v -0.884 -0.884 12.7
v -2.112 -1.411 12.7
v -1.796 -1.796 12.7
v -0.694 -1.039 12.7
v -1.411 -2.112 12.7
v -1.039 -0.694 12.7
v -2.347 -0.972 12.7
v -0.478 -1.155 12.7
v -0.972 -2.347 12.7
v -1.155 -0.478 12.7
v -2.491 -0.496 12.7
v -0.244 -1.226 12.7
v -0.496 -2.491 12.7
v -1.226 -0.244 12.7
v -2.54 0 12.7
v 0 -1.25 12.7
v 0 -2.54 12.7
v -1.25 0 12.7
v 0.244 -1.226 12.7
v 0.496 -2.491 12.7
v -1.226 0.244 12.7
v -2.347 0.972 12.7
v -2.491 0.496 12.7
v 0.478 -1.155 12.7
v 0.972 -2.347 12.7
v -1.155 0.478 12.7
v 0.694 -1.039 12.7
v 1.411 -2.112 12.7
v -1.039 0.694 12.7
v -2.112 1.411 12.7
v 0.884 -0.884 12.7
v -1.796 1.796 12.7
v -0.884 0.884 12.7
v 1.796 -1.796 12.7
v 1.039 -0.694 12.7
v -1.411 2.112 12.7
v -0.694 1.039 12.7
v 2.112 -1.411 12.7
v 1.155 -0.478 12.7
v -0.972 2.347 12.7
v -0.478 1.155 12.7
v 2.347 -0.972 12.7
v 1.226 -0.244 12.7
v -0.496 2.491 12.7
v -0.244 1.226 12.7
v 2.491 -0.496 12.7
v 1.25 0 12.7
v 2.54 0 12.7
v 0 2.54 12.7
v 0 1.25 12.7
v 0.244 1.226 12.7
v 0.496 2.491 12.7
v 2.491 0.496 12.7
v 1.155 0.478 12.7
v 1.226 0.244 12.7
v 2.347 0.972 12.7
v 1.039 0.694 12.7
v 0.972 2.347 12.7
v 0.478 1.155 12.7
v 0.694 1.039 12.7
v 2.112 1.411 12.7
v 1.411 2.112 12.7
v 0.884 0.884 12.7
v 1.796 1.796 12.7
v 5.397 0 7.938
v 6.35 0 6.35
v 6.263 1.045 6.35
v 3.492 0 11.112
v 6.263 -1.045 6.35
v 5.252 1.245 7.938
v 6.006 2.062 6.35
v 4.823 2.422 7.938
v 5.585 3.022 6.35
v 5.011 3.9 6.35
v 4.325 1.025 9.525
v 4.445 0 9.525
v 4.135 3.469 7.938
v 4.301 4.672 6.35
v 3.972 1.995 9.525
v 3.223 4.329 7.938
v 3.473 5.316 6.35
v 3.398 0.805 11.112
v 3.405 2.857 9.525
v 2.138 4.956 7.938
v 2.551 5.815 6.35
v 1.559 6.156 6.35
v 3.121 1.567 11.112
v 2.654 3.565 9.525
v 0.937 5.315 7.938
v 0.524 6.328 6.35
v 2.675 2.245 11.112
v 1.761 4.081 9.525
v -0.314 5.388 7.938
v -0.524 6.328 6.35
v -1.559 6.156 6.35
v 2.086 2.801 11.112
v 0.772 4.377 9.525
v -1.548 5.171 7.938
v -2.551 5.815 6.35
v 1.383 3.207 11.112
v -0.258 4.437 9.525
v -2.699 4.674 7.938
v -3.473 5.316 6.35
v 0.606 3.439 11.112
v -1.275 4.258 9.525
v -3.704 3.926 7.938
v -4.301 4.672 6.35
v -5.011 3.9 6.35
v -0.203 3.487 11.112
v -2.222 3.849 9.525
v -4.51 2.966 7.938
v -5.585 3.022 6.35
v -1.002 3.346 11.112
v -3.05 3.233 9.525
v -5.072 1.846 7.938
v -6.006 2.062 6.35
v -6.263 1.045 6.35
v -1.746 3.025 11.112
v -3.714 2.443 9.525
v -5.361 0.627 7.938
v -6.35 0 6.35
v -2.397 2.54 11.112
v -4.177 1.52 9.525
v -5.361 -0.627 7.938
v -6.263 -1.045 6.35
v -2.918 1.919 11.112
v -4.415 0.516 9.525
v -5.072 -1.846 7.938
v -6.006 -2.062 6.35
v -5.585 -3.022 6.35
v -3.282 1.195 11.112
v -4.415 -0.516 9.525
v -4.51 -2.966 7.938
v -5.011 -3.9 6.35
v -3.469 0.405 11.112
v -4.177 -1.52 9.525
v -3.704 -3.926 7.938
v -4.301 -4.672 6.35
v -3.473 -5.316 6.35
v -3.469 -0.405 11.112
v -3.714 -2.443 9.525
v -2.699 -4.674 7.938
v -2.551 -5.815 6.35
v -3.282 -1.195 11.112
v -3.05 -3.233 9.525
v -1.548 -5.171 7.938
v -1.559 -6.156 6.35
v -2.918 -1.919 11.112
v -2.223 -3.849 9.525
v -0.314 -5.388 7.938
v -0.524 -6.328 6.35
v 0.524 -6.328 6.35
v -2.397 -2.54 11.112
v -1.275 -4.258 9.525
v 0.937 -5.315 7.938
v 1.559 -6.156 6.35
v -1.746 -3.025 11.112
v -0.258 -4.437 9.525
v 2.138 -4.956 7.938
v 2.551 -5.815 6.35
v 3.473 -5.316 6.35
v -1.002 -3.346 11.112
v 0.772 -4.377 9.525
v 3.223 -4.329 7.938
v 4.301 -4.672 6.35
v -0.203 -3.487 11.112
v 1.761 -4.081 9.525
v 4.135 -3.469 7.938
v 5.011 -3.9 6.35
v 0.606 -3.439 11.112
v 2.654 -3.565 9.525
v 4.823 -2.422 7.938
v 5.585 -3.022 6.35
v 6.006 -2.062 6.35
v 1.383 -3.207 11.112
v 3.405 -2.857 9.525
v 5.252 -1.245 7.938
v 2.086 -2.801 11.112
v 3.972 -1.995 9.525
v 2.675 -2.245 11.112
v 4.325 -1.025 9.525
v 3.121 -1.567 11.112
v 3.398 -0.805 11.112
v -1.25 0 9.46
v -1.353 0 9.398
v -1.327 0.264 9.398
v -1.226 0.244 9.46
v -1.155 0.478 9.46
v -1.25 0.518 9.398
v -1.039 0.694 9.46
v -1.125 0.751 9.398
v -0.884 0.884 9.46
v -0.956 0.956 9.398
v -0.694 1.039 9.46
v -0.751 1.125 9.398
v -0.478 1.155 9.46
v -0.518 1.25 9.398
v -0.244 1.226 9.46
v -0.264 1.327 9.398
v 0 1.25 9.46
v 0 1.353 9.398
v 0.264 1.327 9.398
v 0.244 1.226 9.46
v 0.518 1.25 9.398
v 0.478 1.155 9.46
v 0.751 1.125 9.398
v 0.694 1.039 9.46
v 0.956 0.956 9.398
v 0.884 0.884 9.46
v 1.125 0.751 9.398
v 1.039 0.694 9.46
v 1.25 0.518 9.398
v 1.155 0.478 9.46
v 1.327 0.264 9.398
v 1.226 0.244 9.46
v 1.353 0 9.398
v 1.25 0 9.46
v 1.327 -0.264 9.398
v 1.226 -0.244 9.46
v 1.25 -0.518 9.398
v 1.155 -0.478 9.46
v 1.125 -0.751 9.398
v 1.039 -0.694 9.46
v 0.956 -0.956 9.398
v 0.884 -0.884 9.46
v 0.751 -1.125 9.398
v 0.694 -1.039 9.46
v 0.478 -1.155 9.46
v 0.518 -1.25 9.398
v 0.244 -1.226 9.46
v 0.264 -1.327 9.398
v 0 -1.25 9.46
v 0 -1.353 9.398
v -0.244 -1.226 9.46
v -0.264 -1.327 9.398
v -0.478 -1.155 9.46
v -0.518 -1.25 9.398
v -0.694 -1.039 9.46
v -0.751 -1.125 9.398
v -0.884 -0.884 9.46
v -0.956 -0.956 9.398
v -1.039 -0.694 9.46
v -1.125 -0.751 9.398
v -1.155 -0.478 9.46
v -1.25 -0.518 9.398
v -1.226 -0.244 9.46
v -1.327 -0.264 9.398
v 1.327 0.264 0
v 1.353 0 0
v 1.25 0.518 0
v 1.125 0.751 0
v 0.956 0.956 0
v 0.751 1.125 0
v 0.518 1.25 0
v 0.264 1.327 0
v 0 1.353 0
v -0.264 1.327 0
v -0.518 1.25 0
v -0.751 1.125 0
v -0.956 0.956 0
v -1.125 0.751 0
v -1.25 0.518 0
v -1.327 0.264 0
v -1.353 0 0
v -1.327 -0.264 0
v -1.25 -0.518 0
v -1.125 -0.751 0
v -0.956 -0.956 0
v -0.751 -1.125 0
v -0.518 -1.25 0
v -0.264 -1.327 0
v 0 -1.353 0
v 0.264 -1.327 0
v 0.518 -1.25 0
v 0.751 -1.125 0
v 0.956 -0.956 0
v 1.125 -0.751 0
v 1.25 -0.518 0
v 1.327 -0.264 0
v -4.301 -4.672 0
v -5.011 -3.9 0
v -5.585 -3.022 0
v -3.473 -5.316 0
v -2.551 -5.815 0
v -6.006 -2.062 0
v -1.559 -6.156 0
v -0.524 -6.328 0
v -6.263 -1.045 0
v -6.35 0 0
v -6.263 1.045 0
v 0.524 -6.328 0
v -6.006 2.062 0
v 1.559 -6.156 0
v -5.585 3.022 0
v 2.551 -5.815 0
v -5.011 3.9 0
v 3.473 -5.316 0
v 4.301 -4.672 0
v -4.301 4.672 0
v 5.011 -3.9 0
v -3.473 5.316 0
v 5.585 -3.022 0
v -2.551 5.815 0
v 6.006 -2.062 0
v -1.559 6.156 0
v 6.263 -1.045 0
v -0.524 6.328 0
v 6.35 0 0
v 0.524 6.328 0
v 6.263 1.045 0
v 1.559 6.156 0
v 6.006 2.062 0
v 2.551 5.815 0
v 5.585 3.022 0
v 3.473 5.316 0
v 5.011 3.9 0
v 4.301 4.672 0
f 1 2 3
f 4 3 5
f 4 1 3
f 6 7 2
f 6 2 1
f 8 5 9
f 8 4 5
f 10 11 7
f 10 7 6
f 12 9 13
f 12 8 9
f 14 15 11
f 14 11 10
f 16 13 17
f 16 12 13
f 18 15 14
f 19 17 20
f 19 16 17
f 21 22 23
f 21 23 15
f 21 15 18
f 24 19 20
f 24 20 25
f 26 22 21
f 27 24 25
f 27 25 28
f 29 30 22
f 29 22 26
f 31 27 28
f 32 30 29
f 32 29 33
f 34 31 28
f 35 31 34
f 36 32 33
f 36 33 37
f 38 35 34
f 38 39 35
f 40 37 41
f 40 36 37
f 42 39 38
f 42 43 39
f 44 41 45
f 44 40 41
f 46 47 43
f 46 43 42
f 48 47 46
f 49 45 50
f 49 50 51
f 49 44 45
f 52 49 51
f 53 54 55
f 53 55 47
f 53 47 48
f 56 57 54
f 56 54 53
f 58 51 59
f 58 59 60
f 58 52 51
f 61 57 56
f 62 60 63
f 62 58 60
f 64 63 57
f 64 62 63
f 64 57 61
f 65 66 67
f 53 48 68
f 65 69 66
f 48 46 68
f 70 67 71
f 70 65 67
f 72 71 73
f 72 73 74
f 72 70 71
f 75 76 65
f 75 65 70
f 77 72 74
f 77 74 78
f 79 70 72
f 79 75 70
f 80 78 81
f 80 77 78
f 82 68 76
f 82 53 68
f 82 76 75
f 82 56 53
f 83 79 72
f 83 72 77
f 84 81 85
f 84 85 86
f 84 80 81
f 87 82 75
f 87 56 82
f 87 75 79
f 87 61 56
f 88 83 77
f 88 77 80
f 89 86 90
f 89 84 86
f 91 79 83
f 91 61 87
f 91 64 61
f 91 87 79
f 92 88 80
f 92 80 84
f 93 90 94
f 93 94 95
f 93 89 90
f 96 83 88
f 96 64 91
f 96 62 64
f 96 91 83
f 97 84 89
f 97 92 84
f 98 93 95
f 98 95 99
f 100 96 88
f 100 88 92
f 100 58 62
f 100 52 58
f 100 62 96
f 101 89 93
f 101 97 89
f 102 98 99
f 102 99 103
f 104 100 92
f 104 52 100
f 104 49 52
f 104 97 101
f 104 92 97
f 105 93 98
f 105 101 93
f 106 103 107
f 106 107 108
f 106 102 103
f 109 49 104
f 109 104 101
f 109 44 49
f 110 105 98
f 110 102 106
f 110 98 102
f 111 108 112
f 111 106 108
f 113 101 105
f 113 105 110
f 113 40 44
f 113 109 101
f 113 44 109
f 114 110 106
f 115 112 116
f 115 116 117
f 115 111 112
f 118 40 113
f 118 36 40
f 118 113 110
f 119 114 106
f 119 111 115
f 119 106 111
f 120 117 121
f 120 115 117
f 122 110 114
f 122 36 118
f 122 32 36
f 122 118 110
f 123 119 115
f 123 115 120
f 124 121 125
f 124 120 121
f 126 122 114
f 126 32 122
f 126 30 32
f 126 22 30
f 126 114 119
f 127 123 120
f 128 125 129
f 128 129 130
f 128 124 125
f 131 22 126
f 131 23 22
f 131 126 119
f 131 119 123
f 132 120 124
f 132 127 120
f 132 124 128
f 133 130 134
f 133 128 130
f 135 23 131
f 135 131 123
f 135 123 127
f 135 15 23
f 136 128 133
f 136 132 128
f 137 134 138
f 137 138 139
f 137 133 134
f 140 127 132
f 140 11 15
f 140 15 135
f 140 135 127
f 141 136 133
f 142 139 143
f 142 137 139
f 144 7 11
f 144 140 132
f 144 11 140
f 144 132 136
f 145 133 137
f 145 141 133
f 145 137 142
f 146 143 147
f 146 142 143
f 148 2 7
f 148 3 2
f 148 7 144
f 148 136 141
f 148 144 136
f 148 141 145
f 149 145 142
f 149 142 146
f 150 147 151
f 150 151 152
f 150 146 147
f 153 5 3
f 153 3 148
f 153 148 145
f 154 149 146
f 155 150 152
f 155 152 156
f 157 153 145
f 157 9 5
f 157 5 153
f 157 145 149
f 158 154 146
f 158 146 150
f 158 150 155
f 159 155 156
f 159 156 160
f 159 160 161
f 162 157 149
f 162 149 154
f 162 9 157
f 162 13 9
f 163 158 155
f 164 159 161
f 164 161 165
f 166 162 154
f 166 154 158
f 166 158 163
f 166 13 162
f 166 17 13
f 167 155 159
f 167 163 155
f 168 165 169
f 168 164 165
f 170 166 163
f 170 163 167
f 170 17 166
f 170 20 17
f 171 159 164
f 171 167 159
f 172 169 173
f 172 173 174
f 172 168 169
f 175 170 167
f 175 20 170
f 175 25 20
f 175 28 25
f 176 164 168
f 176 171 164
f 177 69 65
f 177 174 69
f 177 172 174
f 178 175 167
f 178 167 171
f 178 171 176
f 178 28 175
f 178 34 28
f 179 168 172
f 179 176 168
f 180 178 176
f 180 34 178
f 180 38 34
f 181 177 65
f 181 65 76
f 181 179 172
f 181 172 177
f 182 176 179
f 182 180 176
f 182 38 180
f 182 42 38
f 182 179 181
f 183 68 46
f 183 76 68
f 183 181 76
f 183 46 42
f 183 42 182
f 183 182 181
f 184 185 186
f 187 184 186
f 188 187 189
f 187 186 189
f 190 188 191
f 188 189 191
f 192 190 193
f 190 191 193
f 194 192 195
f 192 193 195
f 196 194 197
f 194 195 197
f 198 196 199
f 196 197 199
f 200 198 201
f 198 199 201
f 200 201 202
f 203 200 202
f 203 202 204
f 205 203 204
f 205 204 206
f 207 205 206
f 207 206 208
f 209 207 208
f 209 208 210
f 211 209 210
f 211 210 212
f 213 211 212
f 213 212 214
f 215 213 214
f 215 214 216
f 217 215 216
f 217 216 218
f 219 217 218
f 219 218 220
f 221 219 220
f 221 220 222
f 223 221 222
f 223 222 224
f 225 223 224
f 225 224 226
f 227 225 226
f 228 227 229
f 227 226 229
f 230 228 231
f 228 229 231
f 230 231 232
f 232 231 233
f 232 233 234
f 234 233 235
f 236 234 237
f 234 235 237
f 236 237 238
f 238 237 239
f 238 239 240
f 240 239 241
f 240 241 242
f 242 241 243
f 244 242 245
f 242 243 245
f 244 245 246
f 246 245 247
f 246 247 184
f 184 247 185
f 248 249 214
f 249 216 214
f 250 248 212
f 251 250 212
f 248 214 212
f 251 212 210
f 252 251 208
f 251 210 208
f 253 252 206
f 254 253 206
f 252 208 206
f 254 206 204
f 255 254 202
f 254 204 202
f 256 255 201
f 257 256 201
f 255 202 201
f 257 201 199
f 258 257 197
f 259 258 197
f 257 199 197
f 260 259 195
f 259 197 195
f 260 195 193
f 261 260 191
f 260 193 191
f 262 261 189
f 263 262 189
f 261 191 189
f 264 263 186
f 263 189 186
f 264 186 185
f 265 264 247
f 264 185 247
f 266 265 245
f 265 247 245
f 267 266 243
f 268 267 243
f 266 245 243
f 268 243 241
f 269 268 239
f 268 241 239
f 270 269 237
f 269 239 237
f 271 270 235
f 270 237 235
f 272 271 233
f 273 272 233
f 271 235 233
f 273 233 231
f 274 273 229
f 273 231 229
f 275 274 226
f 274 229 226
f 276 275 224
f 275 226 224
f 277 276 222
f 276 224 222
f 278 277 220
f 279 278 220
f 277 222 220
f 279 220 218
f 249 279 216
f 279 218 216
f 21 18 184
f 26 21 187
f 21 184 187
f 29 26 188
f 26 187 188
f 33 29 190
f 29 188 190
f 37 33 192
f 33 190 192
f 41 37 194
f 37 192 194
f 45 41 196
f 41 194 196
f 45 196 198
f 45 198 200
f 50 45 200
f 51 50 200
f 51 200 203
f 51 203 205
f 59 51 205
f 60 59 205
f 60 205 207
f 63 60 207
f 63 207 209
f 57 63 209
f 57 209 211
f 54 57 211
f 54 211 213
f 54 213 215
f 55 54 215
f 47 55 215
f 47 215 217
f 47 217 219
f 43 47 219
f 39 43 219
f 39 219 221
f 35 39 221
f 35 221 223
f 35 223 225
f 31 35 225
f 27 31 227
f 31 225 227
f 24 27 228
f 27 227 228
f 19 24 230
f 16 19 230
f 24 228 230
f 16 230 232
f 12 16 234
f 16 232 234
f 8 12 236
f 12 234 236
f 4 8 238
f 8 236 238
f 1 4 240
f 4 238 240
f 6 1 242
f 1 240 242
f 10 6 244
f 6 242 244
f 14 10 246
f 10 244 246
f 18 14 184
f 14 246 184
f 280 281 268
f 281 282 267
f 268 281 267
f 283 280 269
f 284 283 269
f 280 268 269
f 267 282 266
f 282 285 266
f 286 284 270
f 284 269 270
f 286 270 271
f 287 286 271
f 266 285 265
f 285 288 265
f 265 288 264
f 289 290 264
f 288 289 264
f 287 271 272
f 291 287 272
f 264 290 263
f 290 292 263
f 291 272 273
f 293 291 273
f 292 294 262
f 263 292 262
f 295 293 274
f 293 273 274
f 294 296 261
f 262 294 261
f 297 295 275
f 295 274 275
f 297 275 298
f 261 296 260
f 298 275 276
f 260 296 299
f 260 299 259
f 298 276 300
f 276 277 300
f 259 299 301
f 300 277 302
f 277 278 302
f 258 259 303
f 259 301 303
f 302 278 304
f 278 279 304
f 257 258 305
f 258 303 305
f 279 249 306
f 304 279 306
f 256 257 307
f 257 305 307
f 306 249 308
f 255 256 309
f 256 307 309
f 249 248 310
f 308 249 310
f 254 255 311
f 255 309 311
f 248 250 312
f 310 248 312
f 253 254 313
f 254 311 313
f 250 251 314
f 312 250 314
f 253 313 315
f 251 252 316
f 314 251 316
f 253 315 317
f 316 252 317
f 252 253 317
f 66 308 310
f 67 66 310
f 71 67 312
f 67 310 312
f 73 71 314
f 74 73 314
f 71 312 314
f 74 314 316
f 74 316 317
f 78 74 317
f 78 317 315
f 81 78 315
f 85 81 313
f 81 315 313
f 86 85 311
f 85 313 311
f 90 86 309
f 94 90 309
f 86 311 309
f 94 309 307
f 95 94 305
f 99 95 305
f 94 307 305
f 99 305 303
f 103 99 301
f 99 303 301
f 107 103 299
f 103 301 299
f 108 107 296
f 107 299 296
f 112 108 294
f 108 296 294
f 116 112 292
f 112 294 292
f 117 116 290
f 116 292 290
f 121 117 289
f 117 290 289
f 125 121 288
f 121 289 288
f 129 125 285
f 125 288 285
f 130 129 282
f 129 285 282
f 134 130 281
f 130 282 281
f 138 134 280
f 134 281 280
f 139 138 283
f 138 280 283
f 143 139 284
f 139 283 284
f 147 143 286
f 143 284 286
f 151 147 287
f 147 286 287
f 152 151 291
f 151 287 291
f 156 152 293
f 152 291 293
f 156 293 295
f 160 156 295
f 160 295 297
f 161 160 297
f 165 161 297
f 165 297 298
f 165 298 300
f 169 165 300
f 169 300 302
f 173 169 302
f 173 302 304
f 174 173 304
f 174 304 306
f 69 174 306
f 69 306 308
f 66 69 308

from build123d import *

# Parameters (mm, degrees)
SKETCH1_R                 = 6.35
BOSS_EXTRUDE1_DEPTH       = 12.7
M3X0_5_TAPPED_HOLE1_D     = 2.5
F_6_32_TAPPED_HOLE1_D     = 2.7051
F_6_32_TAPPED_HOLE1_DEPTH = 9.398
F_6_32_TAPPED_HOLE1_TIP   = 0.81269403
CHAMFER1_SIZE             = 6.35
CHAMFER1_SIZE2            = 3.81


with BuildPart() as part:
    # Sketch1 → Boss-Extrude1 (new body)
    with BuildSketch(Plane.XY):
        Circle(SKETCH1_R)
    extrude(amount=BOSS_EXTRUDE1_DEPTH)

    # M3x0.5 Tapped Hole1 (through all)
    with Locations(Plane.XY.offset(12.7)):
        with Locations((0, 0)):
            Hole(M3X0_5_TAPPED_HOLE1_D / 2)

    # #6-32 Tapped Hole1
    with Locations(Plane(origin=(0, 0, 0), x_dir=(-1, 0, 0), z_dir=(0, 0, -1))):
        with Locations((0, 0)):
            Hole(F_6_32_TAPPED_HOLE1_D / 2, depth=F_6_32_TAPPED_HOLE1_DEPTH)
            with Locations((0, 0, -(F_6_32_TAPPED_HOLE1_DEPTH + F_6_32_TAPPED_HOLE1_TIP / 2))):  # 118° drill point
                Cone(0, F_6_32_TAPPED_HOLE1_D / 2, F_6_32_TAPPED_HOLE1_TIP, mode=Mode.SUBTRACT)

    # Chamfer1
    chamfer1_edges = [part.edges().sort_by_distance(p)[0] for p in [
        (-6.35, 0, 12.7),
    ]]
    chamfer1_side = [part.faces().sort_by_distance(p)[0] for p in [
        (-6.35, 0, 6.35),
    ]]
    chamfer(chamfer1_edges, length=CHAMFER1_SIZE, length2=CHAMFER1_SIZE2, reference=chamfer1_side[0])


solid = part.part
